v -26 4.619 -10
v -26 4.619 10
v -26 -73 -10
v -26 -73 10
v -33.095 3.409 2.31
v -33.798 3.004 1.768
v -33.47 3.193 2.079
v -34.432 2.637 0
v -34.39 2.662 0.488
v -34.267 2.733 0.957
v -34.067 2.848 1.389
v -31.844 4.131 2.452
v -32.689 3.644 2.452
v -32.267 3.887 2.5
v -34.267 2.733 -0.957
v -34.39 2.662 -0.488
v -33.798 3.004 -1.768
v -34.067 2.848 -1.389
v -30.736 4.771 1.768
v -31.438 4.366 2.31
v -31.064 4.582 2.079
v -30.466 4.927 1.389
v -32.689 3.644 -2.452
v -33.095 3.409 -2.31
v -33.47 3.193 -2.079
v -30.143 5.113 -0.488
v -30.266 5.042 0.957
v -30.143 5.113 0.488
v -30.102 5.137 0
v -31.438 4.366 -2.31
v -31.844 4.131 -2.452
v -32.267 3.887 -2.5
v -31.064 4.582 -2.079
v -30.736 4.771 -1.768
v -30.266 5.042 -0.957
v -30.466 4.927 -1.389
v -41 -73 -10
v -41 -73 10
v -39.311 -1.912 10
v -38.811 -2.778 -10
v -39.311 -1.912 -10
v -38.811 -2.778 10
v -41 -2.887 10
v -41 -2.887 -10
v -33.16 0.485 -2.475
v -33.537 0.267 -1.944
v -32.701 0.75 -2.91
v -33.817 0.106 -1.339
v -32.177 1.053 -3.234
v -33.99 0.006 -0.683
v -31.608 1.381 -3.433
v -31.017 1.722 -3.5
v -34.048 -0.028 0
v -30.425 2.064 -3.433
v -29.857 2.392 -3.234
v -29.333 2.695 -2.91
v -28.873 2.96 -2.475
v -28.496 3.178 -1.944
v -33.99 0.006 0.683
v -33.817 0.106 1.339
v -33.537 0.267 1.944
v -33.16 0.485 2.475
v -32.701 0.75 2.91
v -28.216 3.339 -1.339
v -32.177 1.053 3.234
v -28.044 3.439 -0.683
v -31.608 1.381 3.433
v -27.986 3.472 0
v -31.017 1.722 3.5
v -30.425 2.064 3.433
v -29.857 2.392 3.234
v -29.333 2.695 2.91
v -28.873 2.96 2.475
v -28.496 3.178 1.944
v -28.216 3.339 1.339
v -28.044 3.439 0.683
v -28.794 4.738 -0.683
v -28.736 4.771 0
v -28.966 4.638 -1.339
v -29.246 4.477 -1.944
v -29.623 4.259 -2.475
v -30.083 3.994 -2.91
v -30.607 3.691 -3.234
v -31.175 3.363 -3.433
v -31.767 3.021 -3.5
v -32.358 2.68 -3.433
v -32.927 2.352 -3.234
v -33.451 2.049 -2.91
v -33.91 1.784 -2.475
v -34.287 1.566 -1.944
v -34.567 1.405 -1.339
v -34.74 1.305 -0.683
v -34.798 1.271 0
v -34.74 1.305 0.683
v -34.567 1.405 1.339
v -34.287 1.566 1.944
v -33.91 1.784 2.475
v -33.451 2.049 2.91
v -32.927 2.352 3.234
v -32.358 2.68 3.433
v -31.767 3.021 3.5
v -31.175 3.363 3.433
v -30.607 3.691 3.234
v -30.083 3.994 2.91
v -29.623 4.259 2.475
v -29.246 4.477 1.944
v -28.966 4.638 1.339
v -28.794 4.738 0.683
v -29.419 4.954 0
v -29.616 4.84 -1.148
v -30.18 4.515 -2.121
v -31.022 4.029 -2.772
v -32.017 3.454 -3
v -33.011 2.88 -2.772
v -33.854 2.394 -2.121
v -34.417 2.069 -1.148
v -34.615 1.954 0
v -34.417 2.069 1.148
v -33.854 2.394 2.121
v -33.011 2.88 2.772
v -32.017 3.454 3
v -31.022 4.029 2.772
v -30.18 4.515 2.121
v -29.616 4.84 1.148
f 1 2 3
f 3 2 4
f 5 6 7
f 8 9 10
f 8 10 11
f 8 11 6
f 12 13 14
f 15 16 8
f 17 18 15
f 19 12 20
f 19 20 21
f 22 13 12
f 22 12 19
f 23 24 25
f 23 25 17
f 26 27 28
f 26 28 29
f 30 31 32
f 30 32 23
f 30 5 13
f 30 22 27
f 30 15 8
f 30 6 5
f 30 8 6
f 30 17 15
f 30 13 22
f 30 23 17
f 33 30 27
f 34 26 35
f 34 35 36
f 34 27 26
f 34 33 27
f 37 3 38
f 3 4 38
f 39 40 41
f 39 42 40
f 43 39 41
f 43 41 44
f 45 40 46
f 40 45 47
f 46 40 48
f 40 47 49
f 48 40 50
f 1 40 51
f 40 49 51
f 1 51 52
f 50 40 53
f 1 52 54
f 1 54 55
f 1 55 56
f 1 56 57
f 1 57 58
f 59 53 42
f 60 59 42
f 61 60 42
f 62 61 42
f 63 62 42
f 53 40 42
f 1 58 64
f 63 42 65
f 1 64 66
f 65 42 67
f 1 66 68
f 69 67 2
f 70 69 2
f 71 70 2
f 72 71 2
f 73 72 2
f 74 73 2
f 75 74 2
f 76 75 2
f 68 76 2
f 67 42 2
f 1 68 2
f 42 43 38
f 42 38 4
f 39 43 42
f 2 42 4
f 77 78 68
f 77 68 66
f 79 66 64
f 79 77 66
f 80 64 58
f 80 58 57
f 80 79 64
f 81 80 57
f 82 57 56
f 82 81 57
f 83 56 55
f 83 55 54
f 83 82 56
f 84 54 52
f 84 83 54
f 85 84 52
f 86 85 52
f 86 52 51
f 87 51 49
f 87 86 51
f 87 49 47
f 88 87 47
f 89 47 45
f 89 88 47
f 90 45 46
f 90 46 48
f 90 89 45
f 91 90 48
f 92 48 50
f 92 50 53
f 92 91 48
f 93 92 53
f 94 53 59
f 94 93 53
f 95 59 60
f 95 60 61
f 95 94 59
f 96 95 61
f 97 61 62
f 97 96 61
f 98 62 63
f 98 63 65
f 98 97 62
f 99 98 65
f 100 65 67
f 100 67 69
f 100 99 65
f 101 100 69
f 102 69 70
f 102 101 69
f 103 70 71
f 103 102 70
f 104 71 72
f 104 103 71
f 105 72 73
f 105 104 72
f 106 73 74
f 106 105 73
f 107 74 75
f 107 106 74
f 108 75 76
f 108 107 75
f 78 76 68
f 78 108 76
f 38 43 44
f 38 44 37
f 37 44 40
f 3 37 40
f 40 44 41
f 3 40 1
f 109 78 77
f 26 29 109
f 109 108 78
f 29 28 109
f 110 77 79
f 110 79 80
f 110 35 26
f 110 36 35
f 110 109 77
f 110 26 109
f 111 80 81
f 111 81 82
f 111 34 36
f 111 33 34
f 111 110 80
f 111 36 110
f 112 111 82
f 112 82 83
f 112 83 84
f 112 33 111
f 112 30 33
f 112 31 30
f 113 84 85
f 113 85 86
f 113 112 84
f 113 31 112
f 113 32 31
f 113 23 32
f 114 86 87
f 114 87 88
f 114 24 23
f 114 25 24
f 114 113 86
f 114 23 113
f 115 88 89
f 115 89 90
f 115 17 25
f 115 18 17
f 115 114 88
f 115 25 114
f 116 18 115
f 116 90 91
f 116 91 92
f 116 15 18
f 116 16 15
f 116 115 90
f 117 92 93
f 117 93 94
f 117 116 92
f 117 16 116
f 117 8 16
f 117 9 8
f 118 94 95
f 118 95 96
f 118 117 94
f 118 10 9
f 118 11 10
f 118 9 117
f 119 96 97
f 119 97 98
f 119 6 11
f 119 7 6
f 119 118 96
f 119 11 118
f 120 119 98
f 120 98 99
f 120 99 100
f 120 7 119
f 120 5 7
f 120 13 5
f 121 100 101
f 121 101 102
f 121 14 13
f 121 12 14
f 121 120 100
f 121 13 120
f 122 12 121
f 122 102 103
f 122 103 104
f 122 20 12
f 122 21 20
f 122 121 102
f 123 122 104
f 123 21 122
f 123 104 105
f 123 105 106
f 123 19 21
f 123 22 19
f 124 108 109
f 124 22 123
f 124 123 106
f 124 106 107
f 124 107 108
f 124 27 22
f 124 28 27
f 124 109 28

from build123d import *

# Parameters (mm, degrees)
EXTRUDE_1_DEPTH     = 9
SKETCH_2_R          = 3.5
CUT_EXTRUDE_1_DEPTH = 18
EXTRUDE_2_DEPTH     = 10
EXTRUDE_START       = 2.5
SKETCH_4_R          = 3.5
EXTRUDE_3_DEPTH     = 2.5
CHAMFER_1_SIZE      = 1
EXTRUDE_5_DEPTH     = 10
SKETCH_7_W          = 65.185315269
SKETCH_7_H          = 30.661532817
CUT_EXTRUDE_2_DEPTH = 10


with BuildPart() as part:
    # 草图1 → 凸台-拉伸1 (new, symmetric)
    with BuildSketch(Plane.XY):
        with BuildLine():
            Line((-38.810889132, -2.777568136), (-8.5, 14.722431864))
            ThreePointArc((-8.5, 14.722431864), (-1.481647627, 16.935309868), (5.814342437, 15.974774553))
            Line((5.814342437, 15.974774553), (6.498382723, 17.854159795))
            ThreePointArc((6.498382723, 17.854159795), (-1.655959112, 18.927699264), (-9.5, 16.454482672))
            Line((-9.5, 16.454482672), (-39.810889132, -1.045517328))
            Line((-39.810889132, -1.045517328), (-38.810889132, -2.777568136))
        make_face()
    extrude(amount=EXTRUDE_1_DEPTH, both=True)

    # 草图2 → 切除-拉伸1 (cut)
    with BuildSketch(Plane(origin=(-9.5, 16.454482672, 0), x_dir=(0.8660254037844398, 0.49999999999999806, 0), z_dir=(-0.49999999999999806, 0.8660254037844398, 0))):
        with Locations(Location((-26, 0, 0), (0, 0, 180))):
            Circle(SKETCH_2_R)
    extrude(amount=-CUT_EXTRUDE_1_DEPTH, mode=Mode.SUBTRACT)

    # 草图7 → 切除-拉伸2 (cut, symmetric)
    with BuildSketch(Plane.XY):
        with Locations((-14.546201846, 8.806087934)):
            Rectangle(SKETCH_7_W, SKETCH_7_H)
    extrude(amount=CUT_EXTRUDE_2_DEPTH, both=True, mode=Mode.SUBTRACT)


with BuildPart() as body_2:
    # 草图3 → 凸台-拉伸2 (new, symmetric)
    with BuildSketch(Plane.XY):
        Polygon((-26, 4.618802154), (-26, -73), (-41, -73), (-41, -4.041451884), align=None)
    extrude(amount=EXTRUDE_2_DEPTH, both=True)

    # 草图4 → 凸台-拉伸3 (add)
    with BuildSketch(Plane(origin=(-8.5, 14.722431864, 0), x_dir=(0.8660254037844386, 0.5000000000000001, 0), z_dir=(-0.5000000000000001, 0.8660254037844386, 0)).offset(EXTRUDE_START)):
        with Locations((-26, 0)):
            Circle(SKETCH_4_R)
    extrude(amount=-EXTRUDE_3_DEPTH)

    # 倒角1
    chamfer_1_edges = [body_2.edges().sort_by_distance(p)[0] for p in [
        (-35.297749412, 2.137495374, 0),
    ]]
    chamfer(chamfer_1_edges, length=CHAMFER_1_SIZE)

    # 草图6 → 凸台-拉伸5 (add, symmetric)
    with BuildSketch(Plane.XY):
        Polygon((-38.810889132, -2.777568136), (-39.310889132, -1.911542732), (-41, -2.886751346), (-41, -4.041451884), align=None)
    extrude(amount=EXTRUDE_5_DEPTH, both=True)


solid = body_2.part
